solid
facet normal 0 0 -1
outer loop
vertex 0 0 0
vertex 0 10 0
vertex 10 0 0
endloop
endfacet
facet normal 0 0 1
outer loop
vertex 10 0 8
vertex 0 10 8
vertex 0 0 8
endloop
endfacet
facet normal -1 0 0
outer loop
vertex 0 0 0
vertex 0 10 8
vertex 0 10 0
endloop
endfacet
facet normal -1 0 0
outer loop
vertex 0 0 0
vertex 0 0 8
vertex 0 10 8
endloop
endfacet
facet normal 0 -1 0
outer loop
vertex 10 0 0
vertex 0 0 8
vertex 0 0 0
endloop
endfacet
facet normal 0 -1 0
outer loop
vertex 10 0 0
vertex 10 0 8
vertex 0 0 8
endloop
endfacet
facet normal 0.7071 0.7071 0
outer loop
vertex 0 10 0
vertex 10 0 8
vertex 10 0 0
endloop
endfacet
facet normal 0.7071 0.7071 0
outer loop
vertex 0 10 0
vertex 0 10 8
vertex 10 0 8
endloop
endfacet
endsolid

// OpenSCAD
// file: parameters.scad
// Speaker enclosure parameters

// Spacing between hexagon shapes in degrees.
spacing = 0.3;

// Absolute amount of spacing between hexagons in mm.
spacingAbs = 1; // mm

// Length of short side of streched hexagon shapes in degrees.
shortSide = 1;

// Distance of streched hexagon side points in degrees
armsDistance = 0.575;

// Hexagon shape height in mm
hexLength = 26.666667;

// Height and length of an enclosure wall.
wallLength = 160;

// In between the hexagon shapes transparent and non-transparent layers alternate.
// Thickness of non-transparent material in between hexagon shapes in mm
solidThickness = 0.6;

// Thickness of transparent material in between hexagon shapes in mm
betweenThickness = 1.2;

// Thickness of hexagon shapes in mm
hexThickness = 7.2;


// Front wall speaker mounting screw holes
// screw hole diameter in mm
screwDiameter = 3.85;

// distance of screw hole from wall center point in mm
screwCenterDistance = 41.5;

// Front wall specific parameters
// Side length of rectangle used to create an indentation [mm].
frontRectLength = 95;

// Diameter of circle for front indentation [mm]
frontCircleDiameter = 103;

// Diameter of the speaker cone hole [mm].
speakerConeDiameter = 93;

// Side walls
// amount of overlapping on edges [mm]
sideEdgeFixWidth = 15;


// Back wall
// Diameter of the banana adapter [mm]
bananaAdapterDiameter = 5;

// Measures of the LED light adapter [mm]
ledAdapterHeight = 7.5;
ledAdapterWidth = 11;

// Distance from adapters to bottom edge [mm]
adapterEdgeDistance = 25;

// Distance between adapters [mm]
adapterDistance = 15;

// Speaker stand
// front width of stand
standWidth = wallLength * 0.9;

// length of speaker stand
standLength = wallLength * 0.9;

// size of the back piece that prevents the speaker from sliding of the stand [mm]
standRimWidth = 5;
standRimHeight = 8;

// max height of the stand [mm]
standHeight = 15;

// Front cover
// front cover thickness [mm]
coverThickness = 5;


/// LED Guide
// Distance from enclosure wall = spacing of strip to wall [mm]
guide_distance = 22.5;

// Thickness of the LED guide [mm]
guide_thickness = 1.5;

// Width of the LED guide [mm]
guide_width = 8;

// Length of one guide segment [mm]
guide_segment_length = 13;

// Length of the guide feet that get attached to the enclosure wall [mm]
guide_foot_length = 5;

// Number of total segments per LED guide
total_segments = 8;

// Width of the LED strip [mm]
led_strip_width = 10;

/// Back-side connectors
connector_length = 8;
connector_outer = 9;
connector_inner = 6;


/// Case
// wall thickness of the case [mm]
case_thickness = 1.2;

// inner case shell measurements [mm]
case_height = 22;
case_width = 85;
case_length = 90;

// diameter of the power connector hole [mm]
power_connector_diameter = 11;
power_connector_dist = 30;

// USB hole measurements [mm]
usb_width = 33;
usb_height = 18;
usb_dist = 3;

// LED connector measurements [mm]
led_connector_height = 8;
led_connector_width = 11;
led_connector_dist = 50;

// rounded case corners
case_bevel_diameter = 5;

case_connector_length = 5;
// main file
include <parameters.scad>;

module led_segment() {
    // rail
    translate([0, 0, guide_distance]) {
        cube([guide_segment_length, guide_width, guide_thickness]);
    }
    
    // connection
    cube([guide_thickness, guide_width, guide_distance]);
    
    mirror([1, 0, 0]) {
        translate([0, guide_width, guide_distance]) {
            rotate([90, 0, 0]) {
                linear_extrude(height = guide_width) {
                    p0 = [-2, 0];
                    p1 = [0, -2];
                    p2 = [0, 0];
                    polygon([p0, p1, p2]);
                }
            }
        }
    }
        
    // foot
    intersection() {
        linear_extrude(height=guide_foot_length) {
            p0 = [guide_segment_length, -3];
            p1 = [0, 0];
            p2 = [0, 7];
            p3 = [guide_segment_length, 11];
            p4 = [guide_segment_length, 10];
            p5 = [0.5, 6];
            p6 = [0.5, 1];
            p7 = [guide_segment_length, -2];
            polygon([p0, p1, p2, p3, p4, p5, p6, p7]);
        }
        
        translate([0, guide_segment_length * 2, 0]) {
            rotate([90, 0, 0]) {
                linear_extrude(height=guide_segment_length * 3) {
                    p0 = [0, 0];
                    p1 = [0, guide_foot_length];
                    p2 = [guide_foot_length, guide_foot_length / 2];
                    p3 = [guide_segment_length - 3, 0];
                    polygon([p0, p1, p2, p3]);
                }
            }
        }
    }
}

module led_guide() {
    for (i = [0 : 1 : total_segments - 1]) {
        if (i % 2 == 0) {
            translate([-i * guide_segment_length, 0, 0]) {
                mirror([1, 0, 0]) {
                    led_segment();
                }
            }
        } else {
            translate([-(i + 1) * guide_segment_length, 0, 0]) {
                led_segment();
            }
        }
    }
}

//led_guide();

module guide_corner() {
    p0 = [0, 0];
    p1 = [led_strip_width, 0];
    p2 = [0, led_strip_width];
    
    linear_extrude(height=guide_width) {
        polygon([p0, p1, p2]);
    }

}

guide_corner();
